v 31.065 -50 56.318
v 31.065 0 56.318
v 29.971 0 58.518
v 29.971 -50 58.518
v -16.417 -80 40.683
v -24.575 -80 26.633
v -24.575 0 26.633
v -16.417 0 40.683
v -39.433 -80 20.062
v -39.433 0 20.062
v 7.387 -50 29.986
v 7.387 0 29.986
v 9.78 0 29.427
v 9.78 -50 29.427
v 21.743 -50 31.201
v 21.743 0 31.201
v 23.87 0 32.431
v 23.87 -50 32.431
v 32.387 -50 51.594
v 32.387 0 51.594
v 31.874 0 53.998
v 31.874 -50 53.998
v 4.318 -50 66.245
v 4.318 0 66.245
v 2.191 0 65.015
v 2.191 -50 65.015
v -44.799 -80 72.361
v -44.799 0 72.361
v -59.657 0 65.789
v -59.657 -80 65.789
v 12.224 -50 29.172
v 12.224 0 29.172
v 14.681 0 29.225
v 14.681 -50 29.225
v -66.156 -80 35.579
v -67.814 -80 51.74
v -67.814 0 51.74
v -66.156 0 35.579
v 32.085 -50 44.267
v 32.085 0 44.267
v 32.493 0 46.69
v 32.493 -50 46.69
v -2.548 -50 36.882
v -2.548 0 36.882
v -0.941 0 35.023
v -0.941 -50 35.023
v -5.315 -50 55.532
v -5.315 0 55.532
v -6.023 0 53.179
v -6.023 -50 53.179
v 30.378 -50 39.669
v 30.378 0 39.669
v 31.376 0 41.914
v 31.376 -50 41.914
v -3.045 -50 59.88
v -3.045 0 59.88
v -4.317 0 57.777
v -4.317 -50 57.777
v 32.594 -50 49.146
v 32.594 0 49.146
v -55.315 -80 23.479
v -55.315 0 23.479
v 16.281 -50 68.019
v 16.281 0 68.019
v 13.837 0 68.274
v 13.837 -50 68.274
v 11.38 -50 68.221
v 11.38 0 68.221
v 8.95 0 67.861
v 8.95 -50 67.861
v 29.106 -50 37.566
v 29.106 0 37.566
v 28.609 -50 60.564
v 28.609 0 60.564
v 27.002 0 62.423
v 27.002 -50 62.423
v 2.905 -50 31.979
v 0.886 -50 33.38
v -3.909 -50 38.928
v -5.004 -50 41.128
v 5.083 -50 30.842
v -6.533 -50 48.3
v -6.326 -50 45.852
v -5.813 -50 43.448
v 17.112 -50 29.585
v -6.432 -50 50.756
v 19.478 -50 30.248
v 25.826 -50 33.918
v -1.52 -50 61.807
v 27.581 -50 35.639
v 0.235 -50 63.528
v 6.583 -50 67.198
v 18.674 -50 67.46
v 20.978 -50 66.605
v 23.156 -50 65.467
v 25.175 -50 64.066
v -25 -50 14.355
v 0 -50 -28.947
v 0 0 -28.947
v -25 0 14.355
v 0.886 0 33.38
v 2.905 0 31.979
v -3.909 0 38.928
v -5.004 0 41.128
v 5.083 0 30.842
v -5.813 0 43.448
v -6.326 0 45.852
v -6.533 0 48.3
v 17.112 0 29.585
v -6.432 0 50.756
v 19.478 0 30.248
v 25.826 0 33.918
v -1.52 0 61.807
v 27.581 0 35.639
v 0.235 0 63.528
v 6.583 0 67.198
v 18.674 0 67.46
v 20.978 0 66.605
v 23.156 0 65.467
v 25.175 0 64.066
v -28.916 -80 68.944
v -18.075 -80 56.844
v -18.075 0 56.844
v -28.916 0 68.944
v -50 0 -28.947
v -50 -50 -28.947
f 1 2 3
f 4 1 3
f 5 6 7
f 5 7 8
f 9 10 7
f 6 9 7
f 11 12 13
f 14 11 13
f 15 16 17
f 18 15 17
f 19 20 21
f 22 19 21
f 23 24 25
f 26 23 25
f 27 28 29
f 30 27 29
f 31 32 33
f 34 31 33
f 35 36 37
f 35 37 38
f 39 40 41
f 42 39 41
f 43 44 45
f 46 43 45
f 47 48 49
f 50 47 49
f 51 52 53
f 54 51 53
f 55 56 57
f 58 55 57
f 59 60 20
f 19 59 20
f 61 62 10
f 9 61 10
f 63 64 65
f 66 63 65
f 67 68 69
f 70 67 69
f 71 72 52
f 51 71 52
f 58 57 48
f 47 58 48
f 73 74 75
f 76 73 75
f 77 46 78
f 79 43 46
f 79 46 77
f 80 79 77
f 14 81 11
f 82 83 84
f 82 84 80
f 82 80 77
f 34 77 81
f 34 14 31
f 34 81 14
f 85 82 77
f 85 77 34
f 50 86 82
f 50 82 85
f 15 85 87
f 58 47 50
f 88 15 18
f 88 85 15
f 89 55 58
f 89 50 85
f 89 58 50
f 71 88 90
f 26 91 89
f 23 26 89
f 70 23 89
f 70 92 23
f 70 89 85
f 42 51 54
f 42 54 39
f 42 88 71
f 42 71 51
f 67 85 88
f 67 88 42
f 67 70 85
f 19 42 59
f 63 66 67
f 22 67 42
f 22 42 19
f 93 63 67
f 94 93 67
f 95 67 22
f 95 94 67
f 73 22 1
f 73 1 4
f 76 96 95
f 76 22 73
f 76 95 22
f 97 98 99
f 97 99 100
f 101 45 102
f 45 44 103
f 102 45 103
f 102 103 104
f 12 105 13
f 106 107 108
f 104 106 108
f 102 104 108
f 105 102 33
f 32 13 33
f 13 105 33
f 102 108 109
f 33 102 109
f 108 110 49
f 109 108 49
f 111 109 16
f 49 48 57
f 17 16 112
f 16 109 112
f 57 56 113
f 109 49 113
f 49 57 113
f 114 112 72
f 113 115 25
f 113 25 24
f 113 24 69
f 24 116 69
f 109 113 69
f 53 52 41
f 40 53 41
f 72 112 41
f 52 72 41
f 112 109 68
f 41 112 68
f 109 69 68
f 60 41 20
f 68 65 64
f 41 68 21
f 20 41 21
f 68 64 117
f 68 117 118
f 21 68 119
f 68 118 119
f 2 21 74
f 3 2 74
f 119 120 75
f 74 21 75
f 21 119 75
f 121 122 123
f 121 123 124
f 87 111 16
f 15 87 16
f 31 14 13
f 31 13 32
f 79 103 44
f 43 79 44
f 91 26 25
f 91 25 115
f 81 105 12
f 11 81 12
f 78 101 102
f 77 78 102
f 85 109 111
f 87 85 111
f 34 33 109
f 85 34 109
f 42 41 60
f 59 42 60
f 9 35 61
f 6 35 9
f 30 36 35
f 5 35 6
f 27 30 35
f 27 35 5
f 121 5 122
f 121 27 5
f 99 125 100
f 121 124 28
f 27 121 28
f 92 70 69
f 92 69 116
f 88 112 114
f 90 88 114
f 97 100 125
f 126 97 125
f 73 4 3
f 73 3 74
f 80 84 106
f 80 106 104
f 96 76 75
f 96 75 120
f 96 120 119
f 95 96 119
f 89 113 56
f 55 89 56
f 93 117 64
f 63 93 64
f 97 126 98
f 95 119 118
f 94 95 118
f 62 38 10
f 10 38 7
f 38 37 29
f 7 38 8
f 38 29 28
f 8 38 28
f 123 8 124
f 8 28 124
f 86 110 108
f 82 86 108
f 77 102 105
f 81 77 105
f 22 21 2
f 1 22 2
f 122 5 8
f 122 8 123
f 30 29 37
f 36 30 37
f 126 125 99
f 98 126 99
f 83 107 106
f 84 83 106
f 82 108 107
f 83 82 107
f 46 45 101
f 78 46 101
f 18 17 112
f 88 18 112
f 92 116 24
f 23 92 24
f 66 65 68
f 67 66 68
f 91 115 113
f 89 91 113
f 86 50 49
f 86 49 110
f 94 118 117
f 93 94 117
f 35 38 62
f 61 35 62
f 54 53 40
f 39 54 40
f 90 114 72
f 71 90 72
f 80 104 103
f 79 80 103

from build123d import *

# Parameters (mm, degrees)
F1_DEPTH = 50
F3_DEPTH = 80
F5_DEPTH = 50


# Not quite as in the source:
# - the program builds the solid bodies; features that only make, move or delete a surface that nothing else refers to are left out


with BuildPart() as f1:
    # F0 (on Front) → F1 (new body)
    with BuildSketch(Plane.XZ):
        Polygon((-25, 14.3545279566), (-50, -28.9467422326), (0, -28.9467422326), align=None)
    extrude(amount=F1_DEPTH)


with BuildPart() as f3:
    # F2 (on Front) → F3 (new body)
    with BuildSketch(Plane.XZ):
        Polygon((-24.5748425958, 26.6332762849), (-16.4171555915, 40.6826237873), (-18.0754474364, 56.8437527904), (-28.9163070091, 68.9436613118), (-44.79889442, 72.360595557), (-59.6566011074, 65.7894027817), (-67.8142881117, 51.7400552794), (-66.1559962667, 35.5789262762), (-55.3151366941, 23.4790177548), (-39.4325492832, 20.0620835096), align=None)
    extrude(amount=F3_DEPTH)


with BuildPart() as f5:
    # F4 (on Front) → F5 (new body)
    with BuildSketch(Plane.XZ):
        Polygon((30.3777791232, 39.6685771282), (31.3758142621, 41.9141553704), (32.0845340135, 44.2671135286), (32.4927614435, 46.6903440471), (32.5940585619, 49.145631133), (32.3868278523, 51.5942534423), (31.874337467, 53.9975947383), (31.0646696855, 56.3177528933), (29.9705934524, 58.518137627), (28.6093630033, 60.5640475578), (27.0024457557, 62.4232174639), (25.1751837545, 64.0663271253), (23.156394013, 65.467463721), (20.9779140514, 66.60453049), (18.6740998, 67.4595952101), (16.2812837859, 68.0191729998), (13.8372021469, 68.2744389831), (11.3803995105, 68.2213674629), (8.9496211219, 67.8607954089), (6.5832018085, 67.1984092578), (4.3184614163, 66.2446552347), (2.1911162543, 65.0145746105), (0.2347158265, 63.5275664914), (-1.5198862636, 61.8070818836), (-3.0450188931, 59.8802538573), (-4.3166298091, 57.7774696414), (-5.314664948, 55.5318913992), (-6.0233846994, 53.178933241), (-6.4316121295, 50.7557027225), (-6.5329092478, 48.3004156366), (-6.3256785383, 45.8517933273), (-5.813188153, 43.4484520313), (-5.0035203715, 41.1282938764), (-3.9094441383, 38.9279091426), (-2.5482136893, 36.8819992118), (-0.9412964417, 35.0228293057), (0.8859655595, 33.3797196443), (2.904755301, 31.9785830486), (5.0832352626, 30.8415162796), (7.387049514, 29.9864515595), (9.7798655282, 29.4268737698), (12.2239471672, 29.1716077865), (14.6807498036, 29.2246793067), (17.1115281921, 29.5852513607), (19.4779475056, 30.2476375118), (21.7426878977, 31.2013915349), (23.8700330597, 32.4314721591), (25.8264334875, 33.9184802783), (27.5810355777, 35.638964886), (29.1061682071, 37.5657929123), align=None)
    extrude(amount=F5_DEPTH)


solid = Compound([f1.part, f3.part, f5.part])
